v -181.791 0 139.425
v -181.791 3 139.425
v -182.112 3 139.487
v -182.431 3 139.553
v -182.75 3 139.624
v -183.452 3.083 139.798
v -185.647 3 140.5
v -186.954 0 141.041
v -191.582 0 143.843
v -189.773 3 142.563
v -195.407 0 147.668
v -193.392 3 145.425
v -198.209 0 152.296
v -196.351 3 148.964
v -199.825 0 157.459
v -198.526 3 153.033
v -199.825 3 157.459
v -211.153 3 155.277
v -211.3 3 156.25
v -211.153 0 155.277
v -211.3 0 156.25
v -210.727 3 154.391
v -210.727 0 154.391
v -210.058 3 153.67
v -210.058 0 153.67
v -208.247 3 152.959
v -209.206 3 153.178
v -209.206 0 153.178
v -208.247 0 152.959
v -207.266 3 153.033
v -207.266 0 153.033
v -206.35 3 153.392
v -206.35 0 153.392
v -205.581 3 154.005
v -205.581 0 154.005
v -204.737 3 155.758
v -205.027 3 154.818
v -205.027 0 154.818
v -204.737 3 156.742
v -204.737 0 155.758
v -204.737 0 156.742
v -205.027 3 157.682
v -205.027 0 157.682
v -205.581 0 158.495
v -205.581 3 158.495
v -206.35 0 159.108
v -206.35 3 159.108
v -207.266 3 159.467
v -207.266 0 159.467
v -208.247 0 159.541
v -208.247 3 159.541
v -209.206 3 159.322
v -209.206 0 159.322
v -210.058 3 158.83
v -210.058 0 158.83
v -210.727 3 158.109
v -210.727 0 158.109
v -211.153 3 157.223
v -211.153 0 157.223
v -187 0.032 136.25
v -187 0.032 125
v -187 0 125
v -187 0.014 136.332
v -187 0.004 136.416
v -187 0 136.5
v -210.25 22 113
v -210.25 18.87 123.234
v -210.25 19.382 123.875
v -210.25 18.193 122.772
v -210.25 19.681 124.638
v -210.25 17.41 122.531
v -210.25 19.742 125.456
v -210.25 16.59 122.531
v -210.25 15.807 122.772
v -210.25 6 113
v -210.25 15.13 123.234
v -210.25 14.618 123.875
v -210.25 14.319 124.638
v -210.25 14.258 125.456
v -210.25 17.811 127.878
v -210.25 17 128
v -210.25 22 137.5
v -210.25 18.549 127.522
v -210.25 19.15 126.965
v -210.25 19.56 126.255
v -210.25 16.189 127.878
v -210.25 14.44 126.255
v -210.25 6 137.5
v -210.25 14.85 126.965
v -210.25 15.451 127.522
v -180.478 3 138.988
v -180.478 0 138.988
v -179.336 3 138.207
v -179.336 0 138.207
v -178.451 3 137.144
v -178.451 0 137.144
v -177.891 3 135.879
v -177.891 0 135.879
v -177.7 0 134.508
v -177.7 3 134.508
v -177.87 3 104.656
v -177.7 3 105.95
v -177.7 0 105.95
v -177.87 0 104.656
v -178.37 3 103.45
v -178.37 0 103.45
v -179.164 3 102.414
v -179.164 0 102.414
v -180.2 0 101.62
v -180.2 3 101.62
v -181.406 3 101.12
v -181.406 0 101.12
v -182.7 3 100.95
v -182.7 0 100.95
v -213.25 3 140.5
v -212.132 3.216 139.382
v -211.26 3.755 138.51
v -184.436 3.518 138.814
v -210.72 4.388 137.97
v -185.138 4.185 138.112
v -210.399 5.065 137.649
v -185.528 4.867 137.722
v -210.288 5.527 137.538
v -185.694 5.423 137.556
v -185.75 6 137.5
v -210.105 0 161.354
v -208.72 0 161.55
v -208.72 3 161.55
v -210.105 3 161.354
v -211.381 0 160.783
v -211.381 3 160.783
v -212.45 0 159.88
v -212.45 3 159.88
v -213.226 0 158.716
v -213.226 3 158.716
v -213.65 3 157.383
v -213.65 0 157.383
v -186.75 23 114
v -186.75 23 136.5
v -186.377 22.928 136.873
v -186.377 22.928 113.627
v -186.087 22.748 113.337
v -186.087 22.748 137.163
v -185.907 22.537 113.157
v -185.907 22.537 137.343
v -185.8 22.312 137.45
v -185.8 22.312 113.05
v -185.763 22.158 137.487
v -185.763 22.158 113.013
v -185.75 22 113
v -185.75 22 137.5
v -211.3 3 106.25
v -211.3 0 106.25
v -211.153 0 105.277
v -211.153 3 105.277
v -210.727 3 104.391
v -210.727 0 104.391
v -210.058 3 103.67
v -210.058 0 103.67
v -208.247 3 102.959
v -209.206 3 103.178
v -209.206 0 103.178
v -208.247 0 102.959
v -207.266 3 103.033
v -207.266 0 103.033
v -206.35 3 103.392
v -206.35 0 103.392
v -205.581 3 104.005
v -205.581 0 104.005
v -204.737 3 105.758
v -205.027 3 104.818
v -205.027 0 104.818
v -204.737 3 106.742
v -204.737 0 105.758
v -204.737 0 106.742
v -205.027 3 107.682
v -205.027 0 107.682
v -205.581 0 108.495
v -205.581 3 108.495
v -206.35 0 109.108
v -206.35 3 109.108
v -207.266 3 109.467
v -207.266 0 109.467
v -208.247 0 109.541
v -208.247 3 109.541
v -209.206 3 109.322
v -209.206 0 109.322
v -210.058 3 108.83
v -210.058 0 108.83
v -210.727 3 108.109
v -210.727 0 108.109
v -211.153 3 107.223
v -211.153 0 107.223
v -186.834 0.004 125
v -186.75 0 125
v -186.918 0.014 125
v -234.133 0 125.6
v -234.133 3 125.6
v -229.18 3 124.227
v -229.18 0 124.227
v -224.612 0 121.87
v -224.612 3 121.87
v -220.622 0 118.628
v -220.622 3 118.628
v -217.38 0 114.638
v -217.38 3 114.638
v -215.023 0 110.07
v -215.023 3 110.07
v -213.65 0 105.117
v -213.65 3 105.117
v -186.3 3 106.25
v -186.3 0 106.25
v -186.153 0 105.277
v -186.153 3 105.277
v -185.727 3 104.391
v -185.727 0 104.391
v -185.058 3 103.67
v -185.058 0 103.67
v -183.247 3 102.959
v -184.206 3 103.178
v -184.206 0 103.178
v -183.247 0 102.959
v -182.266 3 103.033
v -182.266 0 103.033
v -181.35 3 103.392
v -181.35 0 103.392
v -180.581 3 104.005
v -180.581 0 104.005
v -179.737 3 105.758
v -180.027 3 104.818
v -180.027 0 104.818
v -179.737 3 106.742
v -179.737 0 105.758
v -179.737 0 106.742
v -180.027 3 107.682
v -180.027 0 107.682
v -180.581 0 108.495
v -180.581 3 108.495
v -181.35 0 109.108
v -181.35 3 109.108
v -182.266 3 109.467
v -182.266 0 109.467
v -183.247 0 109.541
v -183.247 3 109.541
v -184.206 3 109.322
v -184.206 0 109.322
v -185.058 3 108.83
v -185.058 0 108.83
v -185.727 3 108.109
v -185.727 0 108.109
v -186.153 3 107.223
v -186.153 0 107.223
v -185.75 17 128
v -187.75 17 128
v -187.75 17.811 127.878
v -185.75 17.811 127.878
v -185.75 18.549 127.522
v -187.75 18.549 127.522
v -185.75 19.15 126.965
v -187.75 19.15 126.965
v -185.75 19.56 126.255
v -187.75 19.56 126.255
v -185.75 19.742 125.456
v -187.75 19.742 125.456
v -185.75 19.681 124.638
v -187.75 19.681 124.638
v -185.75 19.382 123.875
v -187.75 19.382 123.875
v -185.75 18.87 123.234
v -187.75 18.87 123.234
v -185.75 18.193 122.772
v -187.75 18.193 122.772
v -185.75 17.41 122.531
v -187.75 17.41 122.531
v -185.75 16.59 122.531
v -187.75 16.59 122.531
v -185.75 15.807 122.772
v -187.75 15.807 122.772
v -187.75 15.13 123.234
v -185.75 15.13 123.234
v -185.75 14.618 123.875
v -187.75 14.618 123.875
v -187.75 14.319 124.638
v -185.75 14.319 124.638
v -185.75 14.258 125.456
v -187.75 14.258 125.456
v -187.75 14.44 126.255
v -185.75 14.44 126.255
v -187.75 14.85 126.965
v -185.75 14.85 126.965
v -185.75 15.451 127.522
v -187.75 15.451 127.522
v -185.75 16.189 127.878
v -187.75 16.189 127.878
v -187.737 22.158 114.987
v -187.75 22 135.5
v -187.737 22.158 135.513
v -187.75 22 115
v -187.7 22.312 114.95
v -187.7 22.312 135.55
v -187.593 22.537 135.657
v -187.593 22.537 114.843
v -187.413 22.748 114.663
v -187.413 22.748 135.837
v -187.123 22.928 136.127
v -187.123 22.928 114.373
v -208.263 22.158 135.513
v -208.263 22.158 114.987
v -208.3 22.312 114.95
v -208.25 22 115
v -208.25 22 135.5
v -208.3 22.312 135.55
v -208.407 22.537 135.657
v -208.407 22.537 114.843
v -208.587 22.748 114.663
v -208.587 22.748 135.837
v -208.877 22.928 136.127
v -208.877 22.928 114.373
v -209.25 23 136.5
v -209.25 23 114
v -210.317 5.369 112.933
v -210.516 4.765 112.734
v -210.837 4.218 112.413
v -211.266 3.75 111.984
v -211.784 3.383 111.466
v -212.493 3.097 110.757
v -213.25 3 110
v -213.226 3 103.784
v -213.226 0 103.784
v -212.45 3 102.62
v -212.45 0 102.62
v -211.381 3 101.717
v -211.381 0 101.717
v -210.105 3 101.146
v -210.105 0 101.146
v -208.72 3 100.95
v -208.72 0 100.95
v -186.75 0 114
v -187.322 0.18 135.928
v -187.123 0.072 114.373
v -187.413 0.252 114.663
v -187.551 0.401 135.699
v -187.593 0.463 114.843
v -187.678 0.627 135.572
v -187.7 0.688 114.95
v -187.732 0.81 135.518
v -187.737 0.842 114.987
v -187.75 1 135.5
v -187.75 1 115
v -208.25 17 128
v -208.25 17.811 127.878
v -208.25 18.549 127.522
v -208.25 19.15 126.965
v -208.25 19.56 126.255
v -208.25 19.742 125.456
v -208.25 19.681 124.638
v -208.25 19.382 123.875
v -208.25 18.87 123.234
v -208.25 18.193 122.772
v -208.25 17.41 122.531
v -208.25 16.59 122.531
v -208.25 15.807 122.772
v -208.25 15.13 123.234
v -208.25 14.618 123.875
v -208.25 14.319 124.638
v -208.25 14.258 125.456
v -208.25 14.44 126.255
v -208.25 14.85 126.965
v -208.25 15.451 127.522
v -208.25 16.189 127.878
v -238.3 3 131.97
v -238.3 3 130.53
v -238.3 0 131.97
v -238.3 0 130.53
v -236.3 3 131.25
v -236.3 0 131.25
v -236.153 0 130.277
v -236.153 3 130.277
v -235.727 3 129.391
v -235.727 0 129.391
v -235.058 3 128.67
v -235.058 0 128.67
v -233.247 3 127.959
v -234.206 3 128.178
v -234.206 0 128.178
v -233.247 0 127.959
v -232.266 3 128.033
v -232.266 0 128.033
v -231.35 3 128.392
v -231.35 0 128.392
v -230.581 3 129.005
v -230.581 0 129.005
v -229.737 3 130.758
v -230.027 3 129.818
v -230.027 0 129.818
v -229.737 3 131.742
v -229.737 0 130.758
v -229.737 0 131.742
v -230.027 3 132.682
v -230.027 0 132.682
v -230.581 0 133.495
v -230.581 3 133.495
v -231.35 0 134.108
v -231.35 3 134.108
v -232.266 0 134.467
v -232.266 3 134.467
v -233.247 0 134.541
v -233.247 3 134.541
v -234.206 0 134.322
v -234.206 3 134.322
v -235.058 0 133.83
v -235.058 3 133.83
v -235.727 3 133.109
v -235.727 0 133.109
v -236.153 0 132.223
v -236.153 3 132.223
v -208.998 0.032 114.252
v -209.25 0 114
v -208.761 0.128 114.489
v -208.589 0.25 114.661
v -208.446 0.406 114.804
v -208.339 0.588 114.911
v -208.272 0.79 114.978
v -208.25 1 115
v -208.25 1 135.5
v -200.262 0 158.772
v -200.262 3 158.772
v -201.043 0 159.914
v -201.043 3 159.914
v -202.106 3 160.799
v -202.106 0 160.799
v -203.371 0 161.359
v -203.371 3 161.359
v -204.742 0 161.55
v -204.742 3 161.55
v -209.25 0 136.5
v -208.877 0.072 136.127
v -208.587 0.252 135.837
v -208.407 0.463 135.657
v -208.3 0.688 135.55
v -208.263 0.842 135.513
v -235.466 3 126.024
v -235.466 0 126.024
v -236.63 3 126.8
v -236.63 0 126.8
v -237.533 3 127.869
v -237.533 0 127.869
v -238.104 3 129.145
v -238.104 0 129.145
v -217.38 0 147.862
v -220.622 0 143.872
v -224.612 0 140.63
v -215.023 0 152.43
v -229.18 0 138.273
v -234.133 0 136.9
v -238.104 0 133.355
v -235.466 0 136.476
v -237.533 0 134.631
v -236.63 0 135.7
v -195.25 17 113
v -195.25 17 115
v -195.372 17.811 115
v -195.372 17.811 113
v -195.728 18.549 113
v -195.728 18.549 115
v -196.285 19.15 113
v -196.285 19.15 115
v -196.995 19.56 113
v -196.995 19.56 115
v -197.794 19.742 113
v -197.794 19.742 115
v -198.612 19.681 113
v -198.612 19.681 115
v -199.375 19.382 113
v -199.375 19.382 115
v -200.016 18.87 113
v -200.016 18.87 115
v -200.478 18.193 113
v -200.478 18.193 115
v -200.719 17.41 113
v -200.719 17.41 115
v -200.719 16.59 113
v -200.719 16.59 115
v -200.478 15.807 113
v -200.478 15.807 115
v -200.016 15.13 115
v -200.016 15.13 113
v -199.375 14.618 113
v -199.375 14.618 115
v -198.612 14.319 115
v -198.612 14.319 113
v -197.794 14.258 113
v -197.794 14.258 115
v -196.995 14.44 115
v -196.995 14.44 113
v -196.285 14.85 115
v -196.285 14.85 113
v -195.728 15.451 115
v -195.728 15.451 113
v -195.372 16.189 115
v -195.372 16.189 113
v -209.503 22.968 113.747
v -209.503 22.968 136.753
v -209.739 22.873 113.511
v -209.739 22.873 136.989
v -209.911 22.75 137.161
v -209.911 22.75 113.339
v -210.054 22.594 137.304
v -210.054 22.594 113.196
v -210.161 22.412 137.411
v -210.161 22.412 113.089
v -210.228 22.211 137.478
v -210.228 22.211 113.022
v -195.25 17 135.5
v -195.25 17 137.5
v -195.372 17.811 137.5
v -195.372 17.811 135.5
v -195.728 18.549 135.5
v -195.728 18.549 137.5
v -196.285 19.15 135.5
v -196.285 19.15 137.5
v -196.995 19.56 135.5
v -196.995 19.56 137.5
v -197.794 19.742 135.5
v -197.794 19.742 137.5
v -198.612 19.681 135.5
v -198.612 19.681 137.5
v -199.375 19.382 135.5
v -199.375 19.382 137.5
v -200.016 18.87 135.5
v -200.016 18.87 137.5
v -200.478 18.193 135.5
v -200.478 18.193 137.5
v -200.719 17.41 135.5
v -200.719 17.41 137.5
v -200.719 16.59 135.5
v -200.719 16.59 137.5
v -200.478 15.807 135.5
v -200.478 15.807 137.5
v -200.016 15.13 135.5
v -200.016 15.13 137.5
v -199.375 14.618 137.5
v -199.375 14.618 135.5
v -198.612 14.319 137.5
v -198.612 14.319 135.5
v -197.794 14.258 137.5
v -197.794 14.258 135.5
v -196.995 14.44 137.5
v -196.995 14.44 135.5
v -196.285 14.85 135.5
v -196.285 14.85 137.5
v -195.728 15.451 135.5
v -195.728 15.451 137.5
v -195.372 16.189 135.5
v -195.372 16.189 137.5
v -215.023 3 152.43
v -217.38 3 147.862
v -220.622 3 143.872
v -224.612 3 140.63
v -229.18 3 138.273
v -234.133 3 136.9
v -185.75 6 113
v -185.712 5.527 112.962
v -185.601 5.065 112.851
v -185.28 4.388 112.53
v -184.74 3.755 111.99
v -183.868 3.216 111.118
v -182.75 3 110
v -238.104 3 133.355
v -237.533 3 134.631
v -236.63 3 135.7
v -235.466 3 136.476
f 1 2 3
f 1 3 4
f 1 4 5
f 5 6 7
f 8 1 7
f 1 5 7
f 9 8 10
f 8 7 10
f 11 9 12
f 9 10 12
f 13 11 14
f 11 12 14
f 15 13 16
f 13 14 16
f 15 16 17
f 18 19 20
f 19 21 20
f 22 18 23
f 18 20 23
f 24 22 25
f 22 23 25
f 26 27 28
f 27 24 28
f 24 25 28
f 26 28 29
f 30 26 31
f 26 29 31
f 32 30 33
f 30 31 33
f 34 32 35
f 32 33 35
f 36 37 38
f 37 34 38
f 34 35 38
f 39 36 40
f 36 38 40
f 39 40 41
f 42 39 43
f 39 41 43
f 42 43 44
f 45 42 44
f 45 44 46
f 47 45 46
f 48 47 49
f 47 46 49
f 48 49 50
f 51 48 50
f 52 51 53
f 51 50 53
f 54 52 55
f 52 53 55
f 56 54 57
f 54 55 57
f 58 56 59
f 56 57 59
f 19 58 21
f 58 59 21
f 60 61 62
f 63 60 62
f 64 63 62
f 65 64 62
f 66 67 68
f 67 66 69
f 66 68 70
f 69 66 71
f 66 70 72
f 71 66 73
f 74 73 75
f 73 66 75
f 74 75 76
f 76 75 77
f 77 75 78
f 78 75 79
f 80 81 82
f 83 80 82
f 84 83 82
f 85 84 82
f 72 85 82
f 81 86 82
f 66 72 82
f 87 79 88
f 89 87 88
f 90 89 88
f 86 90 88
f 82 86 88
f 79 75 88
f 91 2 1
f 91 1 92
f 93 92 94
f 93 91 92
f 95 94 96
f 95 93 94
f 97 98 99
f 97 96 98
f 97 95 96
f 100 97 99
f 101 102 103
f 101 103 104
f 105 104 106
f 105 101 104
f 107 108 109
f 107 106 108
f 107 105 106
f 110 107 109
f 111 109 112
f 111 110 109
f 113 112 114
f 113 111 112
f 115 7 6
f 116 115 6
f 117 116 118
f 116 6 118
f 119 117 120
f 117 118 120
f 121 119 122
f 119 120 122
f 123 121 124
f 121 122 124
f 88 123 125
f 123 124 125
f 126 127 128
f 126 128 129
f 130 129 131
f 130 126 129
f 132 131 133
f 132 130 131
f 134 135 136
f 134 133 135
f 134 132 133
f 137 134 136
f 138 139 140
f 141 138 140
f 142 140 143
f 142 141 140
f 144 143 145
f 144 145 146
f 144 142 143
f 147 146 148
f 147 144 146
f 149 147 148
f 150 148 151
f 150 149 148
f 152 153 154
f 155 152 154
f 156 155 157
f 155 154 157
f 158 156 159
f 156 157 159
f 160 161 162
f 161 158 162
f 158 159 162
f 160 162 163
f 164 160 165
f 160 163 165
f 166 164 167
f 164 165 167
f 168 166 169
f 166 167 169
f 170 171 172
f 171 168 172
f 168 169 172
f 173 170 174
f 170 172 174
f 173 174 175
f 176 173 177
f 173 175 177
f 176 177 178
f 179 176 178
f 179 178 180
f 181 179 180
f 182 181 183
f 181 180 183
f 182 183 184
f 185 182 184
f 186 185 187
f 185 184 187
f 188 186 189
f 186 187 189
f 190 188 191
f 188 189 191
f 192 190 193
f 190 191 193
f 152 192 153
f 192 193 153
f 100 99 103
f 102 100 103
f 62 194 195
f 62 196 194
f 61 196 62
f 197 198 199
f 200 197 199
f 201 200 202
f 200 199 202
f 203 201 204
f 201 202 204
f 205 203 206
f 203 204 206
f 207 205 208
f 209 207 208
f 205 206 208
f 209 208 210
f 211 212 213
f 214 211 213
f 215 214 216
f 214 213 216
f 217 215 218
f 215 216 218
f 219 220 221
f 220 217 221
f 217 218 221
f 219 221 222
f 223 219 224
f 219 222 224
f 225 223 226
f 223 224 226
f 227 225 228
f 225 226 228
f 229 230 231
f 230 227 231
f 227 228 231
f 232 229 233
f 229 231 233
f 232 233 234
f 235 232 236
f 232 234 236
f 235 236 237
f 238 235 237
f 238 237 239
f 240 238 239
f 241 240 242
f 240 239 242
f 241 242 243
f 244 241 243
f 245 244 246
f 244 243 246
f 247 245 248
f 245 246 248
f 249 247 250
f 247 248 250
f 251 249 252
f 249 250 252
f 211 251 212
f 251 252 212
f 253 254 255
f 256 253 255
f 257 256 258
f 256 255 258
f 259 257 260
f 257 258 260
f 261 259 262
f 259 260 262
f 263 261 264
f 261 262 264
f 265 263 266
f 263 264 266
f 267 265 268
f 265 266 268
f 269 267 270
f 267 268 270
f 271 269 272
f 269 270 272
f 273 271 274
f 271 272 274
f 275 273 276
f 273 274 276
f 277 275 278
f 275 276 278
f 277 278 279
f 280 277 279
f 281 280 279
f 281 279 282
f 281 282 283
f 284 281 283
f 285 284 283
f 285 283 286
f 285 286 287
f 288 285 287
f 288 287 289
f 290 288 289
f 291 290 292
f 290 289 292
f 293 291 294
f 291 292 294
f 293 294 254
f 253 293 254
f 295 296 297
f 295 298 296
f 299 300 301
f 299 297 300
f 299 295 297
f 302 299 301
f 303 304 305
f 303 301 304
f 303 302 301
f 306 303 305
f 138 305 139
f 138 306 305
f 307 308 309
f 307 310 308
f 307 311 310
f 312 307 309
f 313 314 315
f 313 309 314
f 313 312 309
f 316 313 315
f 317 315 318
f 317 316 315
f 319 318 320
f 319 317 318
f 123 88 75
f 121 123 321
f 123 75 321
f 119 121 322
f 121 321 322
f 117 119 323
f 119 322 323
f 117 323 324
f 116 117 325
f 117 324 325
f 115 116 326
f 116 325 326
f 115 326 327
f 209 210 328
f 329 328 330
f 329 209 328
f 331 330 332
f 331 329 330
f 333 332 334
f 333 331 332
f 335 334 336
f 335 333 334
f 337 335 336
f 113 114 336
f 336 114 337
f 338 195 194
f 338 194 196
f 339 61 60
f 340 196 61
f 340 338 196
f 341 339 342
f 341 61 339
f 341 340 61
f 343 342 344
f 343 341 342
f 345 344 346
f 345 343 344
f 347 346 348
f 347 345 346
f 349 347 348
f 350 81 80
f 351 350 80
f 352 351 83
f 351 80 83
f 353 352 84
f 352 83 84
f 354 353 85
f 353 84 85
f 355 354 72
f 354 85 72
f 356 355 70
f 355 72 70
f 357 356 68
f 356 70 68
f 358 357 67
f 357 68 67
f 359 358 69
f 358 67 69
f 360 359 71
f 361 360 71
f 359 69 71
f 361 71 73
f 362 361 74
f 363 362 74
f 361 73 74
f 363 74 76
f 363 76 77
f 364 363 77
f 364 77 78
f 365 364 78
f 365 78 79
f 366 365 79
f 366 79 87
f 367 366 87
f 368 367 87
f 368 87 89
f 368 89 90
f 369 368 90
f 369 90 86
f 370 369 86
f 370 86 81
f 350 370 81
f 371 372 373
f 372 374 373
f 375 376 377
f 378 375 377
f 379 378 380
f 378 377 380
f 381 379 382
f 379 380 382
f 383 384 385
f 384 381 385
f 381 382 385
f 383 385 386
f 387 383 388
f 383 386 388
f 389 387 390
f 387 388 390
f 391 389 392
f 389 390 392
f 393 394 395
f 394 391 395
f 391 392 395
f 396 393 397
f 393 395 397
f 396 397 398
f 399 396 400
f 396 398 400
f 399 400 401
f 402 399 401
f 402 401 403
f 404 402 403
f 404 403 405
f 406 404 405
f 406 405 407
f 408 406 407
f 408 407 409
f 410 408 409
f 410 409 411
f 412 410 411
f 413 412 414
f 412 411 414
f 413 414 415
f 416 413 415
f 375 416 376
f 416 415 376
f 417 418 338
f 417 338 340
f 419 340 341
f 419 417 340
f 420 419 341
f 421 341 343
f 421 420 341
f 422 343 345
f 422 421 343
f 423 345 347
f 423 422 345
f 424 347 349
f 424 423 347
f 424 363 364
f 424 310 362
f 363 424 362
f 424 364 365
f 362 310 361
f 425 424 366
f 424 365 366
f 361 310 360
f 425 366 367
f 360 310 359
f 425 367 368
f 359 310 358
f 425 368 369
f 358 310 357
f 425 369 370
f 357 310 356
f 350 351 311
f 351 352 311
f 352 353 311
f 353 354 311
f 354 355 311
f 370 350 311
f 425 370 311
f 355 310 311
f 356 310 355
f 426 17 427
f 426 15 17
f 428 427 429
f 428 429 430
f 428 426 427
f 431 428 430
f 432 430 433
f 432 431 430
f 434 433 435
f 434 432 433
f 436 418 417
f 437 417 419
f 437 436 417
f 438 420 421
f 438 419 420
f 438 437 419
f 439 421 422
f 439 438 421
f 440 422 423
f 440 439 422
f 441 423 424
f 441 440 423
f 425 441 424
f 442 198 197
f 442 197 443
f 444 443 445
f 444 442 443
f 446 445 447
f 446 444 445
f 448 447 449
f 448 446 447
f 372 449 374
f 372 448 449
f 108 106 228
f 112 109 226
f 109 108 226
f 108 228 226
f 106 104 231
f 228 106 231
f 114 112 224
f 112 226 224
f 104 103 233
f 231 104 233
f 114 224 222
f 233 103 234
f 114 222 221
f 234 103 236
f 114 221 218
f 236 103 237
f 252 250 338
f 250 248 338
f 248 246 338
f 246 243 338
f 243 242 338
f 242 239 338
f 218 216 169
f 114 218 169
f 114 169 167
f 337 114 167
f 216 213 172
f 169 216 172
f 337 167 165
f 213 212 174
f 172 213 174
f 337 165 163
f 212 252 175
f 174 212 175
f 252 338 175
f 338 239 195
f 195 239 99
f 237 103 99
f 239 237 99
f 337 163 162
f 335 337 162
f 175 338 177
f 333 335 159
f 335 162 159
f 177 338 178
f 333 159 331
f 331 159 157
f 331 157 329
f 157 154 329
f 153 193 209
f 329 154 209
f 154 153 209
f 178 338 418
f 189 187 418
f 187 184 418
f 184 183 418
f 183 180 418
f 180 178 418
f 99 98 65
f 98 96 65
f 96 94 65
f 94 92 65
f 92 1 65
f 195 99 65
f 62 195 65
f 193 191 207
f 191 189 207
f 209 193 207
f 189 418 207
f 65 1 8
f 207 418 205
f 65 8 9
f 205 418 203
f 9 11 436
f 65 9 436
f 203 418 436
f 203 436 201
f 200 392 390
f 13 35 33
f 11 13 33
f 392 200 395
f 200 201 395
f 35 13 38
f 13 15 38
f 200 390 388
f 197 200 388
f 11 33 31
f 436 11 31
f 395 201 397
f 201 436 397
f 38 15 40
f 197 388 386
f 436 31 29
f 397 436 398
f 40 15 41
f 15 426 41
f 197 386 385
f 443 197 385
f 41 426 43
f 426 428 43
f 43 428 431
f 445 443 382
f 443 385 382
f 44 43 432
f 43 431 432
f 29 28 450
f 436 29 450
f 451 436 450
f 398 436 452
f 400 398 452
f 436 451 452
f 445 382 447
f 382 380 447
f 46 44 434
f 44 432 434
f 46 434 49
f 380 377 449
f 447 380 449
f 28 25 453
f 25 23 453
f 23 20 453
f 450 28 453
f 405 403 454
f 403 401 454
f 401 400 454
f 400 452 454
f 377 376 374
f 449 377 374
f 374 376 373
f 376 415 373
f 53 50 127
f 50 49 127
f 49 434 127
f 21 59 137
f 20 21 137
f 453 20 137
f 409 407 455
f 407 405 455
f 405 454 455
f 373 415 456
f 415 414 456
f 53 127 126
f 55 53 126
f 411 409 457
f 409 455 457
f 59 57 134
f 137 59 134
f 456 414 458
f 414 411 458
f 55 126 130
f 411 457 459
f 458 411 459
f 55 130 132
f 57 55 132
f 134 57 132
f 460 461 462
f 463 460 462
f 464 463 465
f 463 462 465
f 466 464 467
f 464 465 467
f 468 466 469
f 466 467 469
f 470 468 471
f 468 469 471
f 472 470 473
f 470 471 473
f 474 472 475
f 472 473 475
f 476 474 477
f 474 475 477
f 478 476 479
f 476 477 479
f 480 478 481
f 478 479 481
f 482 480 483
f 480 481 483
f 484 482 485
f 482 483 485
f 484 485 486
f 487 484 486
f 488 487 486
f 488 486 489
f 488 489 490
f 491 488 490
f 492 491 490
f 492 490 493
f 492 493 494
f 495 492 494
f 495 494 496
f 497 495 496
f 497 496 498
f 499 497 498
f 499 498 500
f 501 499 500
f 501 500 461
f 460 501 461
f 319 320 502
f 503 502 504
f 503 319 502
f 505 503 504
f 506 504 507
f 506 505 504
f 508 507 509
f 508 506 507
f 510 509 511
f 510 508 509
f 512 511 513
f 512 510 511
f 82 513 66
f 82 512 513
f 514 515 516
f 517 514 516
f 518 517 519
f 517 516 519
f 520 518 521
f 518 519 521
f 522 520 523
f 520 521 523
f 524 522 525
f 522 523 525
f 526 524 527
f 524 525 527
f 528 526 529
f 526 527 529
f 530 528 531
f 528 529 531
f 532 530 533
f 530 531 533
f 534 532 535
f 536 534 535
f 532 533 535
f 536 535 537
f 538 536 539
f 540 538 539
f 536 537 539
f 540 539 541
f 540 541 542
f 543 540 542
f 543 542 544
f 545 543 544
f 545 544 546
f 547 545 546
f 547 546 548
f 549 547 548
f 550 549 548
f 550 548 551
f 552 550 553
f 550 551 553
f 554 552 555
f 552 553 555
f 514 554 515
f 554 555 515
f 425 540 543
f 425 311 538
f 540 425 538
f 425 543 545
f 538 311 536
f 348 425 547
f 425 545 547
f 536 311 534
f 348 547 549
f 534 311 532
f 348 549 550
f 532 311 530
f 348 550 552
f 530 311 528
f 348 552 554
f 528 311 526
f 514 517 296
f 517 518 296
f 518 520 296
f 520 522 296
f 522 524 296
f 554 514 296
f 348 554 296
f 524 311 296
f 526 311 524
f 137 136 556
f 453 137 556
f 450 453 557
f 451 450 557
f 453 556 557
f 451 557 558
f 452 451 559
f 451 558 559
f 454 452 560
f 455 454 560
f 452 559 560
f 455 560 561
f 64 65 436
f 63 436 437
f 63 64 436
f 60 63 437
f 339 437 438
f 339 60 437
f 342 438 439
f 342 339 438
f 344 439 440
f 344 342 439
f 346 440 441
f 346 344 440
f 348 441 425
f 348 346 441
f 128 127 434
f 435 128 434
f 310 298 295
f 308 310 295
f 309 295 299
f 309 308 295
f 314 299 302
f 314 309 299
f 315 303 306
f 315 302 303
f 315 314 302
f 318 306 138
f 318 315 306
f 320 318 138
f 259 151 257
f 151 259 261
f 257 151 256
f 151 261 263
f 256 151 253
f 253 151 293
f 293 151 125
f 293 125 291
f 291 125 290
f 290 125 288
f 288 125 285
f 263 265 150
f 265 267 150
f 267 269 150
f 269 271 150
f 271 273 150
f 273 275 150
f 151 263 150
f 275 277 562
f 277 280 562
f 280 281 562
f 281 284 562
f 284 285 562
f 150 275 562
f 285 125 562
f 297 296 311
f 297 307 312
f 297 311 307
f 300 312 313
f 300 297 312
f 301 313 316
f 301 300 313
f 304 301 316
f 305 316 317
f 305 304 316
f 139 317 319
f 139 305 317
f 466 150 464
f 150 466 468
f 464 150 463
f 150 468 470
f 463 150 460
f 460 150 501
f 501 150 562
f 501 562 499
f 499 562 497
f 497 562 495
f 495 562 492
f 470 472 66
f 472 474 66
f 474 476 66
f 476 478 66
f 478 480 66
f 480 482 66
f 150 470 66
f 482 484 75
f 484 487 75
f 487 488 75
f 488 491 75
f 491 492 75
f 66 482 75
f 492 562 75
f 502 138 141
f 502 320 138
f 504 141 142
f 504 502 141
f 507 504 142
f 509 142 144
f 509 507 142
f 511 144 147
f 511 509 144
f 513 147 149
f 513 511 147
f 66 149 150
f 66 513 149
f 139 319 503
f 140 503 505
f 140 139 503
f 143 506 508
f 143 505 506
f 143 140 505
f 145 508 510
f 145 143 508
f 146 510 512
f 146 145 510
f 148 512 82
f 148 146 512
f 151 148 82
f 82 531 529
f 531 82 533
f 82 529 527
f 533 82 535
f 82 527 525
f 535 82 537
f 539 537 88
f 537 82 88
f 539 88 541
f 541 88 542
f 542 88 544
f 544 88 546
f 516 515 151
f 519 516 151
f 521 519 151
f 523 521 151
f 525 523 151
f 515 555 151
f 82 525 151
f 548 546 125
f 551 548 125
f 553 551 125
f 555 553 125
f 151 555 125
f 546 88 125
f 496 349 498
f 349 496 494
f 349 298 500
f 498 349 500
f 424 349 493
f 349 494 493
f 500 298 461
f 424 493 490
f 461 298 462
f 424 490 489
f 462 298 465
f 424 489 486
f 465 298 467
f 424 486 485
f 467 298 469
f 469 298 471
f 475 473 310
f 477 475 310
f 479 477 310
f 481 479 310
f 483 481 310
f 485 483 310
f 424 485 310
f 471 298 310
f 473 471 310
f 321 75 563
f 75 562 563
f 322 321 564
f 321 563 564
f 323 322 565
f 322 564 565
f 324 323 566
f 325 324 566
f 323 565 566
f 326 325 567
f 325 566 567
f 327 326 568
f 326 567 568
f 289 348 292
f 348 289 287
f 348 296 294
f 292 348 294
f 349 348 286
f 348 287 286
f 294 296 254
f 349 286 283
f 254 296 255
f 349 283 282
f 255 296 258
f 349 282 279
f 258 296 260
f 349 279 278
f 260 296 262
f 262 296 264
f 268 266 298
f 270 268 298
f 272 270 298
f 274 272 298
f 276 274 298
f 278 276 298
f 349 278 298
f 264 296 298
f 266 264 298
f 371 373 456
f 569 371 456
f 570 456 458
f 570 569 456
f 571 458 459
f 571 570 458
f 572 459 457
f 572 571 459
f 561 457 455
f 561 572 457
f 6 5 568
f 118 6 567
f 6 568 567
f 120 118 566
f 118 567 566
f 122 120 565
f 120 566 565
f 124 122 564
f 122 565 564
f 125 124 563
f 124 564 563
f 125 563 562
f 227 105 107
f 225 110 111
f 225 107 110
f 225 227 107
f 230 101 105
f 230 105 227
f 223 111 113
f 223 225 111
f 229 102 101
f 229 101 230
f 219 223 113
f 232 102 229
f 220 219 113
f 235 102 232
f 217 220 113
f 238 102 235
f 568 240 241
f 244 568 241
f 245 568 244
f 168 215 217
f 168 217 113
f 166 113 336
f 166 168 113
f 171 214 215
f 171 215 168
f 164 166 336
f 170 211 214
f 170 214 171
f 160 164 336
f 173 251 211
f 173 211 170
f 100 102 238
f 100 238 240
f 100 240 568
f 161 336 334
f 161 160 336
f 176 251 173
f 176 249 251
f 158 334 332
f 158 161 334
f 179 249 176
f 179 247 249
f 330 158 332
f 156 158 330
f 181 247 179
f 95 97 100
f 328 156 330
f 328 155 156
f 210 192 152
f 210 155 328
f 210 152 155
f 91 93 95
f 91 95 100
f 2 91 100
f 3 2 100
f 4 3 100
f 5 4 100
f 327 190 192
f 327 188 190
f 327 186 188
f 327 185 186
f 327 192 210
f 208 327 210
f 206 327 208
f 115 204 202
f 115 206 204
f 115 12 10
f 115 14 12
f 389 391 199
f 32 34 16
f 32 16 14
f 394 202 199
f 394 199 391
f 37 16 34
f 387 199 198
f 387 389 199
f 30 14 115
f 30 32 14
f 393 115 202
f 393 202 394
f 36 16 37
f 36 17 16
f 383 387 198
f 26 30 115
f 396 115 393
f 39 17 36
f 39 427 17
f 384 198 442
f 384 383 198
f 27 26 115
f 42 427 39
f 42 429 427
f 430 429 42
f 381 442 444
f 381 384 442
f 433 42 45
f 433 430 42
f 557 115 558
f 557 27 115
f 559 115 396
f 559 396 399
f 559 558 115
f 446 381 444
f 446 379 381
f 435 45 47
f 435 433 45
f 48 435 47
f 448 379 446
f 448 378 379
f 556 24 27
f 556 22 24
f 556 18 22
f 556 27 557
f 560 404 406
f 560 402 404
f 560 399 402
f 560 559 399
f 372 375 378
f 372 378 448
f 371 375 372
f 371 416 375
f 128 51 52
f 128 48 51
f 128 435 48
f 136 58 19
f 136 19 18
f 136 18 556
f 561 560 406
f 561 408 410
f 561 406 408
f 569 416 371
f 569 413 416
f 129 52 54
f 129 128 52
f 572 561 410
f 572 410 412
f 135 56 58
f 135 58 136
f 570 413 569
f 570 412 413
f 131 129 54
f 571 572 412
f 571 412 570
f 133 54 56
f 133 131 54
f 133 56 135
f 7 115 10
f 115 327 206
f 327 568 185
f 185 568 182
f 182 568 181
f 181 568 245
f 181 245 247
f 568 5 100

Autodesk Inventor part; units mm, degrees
ref_plane "YZ Plane" through (0, 0, 0) normal (1, 0, 0) x (0, 1, 0)
ref_plane "XZ Plane" through (0, 0, 0) normal (0, 1, 0) x (-1, 0, 0)
ref_plane "XY Plane" through (0, 0, 0) normal (0, 0, 1) x (1, 0, 0)
sketch "Sketch1" plane through (0, 0, 0) normal (0, 1, 0) x (-1, 0, 0)
  line L0 (245.5, 243.75) -> (-204.5, 243.75)
  line L1 (-204.5, 243.75) -> (-204.5, -206.25)
  line L2 (-204.5, -206.25) -> (245.5, -206.25)
  line L3 (245.5, -206.25) -> (245.5, 243.75)
  circle A0 centre (233, 231.25) radius 3.3
  circle A1 centre (233, 206.25) radius 3.3
  circle A2 centre (233, 181.25) radius 3.3
  circle A3 centre (233, 156.25) radius 3.3
  circle A4 centre (233, 131.25) radius 3.3
  circle A5 centre (233, 106.25) radius 3.3
  circle A6 centre (233, 81.25) radius 3.3
  circle A7 centre (233, 56.25) radius 3.3
  circle A8 centre (233, 31.25) radius 3.3
  circle A9 centre (233, 6.25) radius 3.3
  circle A10 centre (233, -18.75) radius 3.3
  circle A11 centre (233, -43.75) radius 3.3
  circle A12 centre (233, -68.75) radius 3.3
  circle A13 centre (233, -93.75) radius 3.3
  circle A14 centre (233, -118.75) radius 3.3
  circle A15 centre (233, -143.75) radius 3.3
  circle A16 centre (233, -168.75) radius 3.3
  circle A17 centre (233, -193.75) radius 3.3
  circle A18 centre (208, 231.25) radius 3.3
  circle A19 centre (208, 206.25) radius 3.3
  circle A20 centre (208, 181.25) radius 3.3
  circle A21 centre (208, 156.25) radius 3.3
  circle A22 centre (208, 131.25) radius 3.3
  circle A23 centre (208, 106.25) radius 3.3
  circle A24 centre (208, 81.25) radius 3.3
  circle A25 centre (208, 56.25) radius 3.3
  circle A26 centre (208, 31.25) radius 3.3
  circle A27 centre (208, 6.25) radius 3.3
  circle A28 centre (208, -18.75) radius 3.3
  circle A29 centre (208, -43.75) radius 3.3
  circle A30 centre (208, -68.75) radius 3.3
  circle A31 centre (208, -93.75) radius 3.3
  circle A32 centre (208, -118.75) radius 3.3
  circle A33 centre (208, -143.75) radius 3.3
  circle A34 centre (208, -168.75) radius 3.3
  circle A35 centre (208, -193.75) radius 3.3
  circle A36 centre (183, 231.25) radius 3.3
  circle A37 centre (183, 206.25) radius 3.3
  circle A38 centre (183, 181.25) radius 3.3
  circle A39 centre (183, 156.25) radius 3.3
  circle A40 centre (183, 131.25) radius 3.3
  circle A41 centre (183, 106.25) radius 3.3
  circle A42 centre (183, 81.25) radius 3.3
  circle A43 centre (183, 56.25) radius 3.3
  circle A44 centre (183, 31.25) radius 3.3
  circle A45 centre (183, 6.25) radius 3.3
  circle A46 centre (183, -18.75) radius 3.3
  circle A47 centre (183, -43.75) radius 3.3
  circle A48 centre (183, -68.75) radius 3.3
  circle A49 centre (183, -93.75) radius 3.3
  circle A50 centre (183, -118.75) radius 3.3
  circle A51 centre (183, -143.75) radius 3.3
  circle A52 centre (183, -168.75) radius 3.3
  circle A53 centre (183, -193.75) radius 3.3
  circle A54 centre (158, 231.25) radius 3.3
  circle A55 centre (158, 206.25) radius 3.3
  circle A56 centre (158, 181.25) radius 3.3
  circle A57 centre (158, 156.25) radius 3.3
  circle A58 centre (158, 131.25) radius 3.3
  circle A59 centre (158, 106.25) radius 3.3
  circle A60 centre (158, 81.25) radius 3.3
  circle A61 centre (158, 56.25) radius 3.3
  circle A62 centre (158, 31.25) radius 3.3
  circle A63 centre (158, 6.25) radius 3.3
  circle A64 centre (158, -18.75) radius 3.3
  circle A65 centre (158, -43.75) radius 3.3
  circle A66 centre (158, -68.75) radius 3.3
  circle A67 centre (158, -93.75) radius 3.3
  circle A68 centre (158, -118.75) radius 3.3
  circle A69 centre (158, -143.75) radius 3.3
  circle A70 centre (158, -168.75) radius 3.3
  circle A71 centre (158, -193.75) radius 3.3
  circle A72 centre (133, 231.25) radius 3.3
  circle A73 centre (133, 206.25) radius 3.3
  circle A74 centre (133, 181.25) radius 3.3
  circle A75 centre (133, 156.25) radius 3.3
  circle A76 centre (133, 131.25) radius 3.3
  circle A77 centre (133, 106.25) radius 3.3
  circle A78 centre (133, 81.25) radius 3.3
  circle A79 centre (133, 56.25) radius 3.3
  circle A80 centre (133, 31.25) radius 3.3
  circle A81 centre (133, 6.25) radius 3.3
  circle A82 centre (133, -18.75) radius 3.3
  circle A83 centre (133, -43.75) radius 3.3
  circle A84 centre (133, -68.75) radius 3.3
  circle A85 centre (133, -93.75) radius 3.3
  circle A86 centre (133, -118.75) radius 3.3
  circle A87 centre (133, -143.75) radius 3.3
  circle A88 centre (133, -168.75) radius 3.3
  circle A89 centre (133, -193.75) radius 3.3
  circle A90 centre (108, 231.25) radius 3.3
  circle A91 centre (108, 206.25) radius 3.3
  circle A92 centre (108, 181.25) radius 3.3
  circle A93 centre (108, 156.25) radius 3.3
  circle A94 centre (108, 131.25) radius 3.3
  circle A95 centre (108, 106.25) radius 3.3
  circle A96 centre (108, 81.25) radius 3.3
  circle A97 centre (108, 56.25) radius 3.3
  circle A98 centre (108, 31.25) radius 3.3
  circle A99 centre (108, 6.25) radius 3.3
  circle A100 centre (108, -18.75) radius 3.3
  circle A101 centre (108, -43.75) radius 3.3
  circle A102 centre (108, -68.75) radius 3.3
  circle A103 centre (108, -93.75) radius 3.3
  circle A104 centre (108, -118.75) radius 3.3
  circle A105 centre (108, -143.75) radius 3.3
  circle A106 centre (108, -168.75) radius 3.3
  circle A107 centre (108, -193.75) radius 3.3
  circle A108 centre (83, 231.25) radius 3.3
  circle A109 centre (83, 206.25) radius 3.3
  circle A110 centre (83, 181.25) radius 3.3
  circle A111 centre (83, 156.25) radius 3.3
  circle A112 centre (83, 131.25) radius 3.3
  circle A113 centre (83, 106.25) radius 3.3
  circle A114 centre (83, 81.25) radius 3.3
  circle A115 centre (83, 56.25) radius 3.3
  circle A116 centre (83, 31.25) radius 3.3
  circle A117 centre (83, 6.25) radius 3.3
  circle A118 centre (83, -18.75) radius 3.3
  circle A119 centre (83, -43.75) radius 3.3
  circle A120 centre (83, -68.75) radius 3.3
  circle A121 centre (83, -93.75) radius 3.3
  circle A122 centre (83, -118.75) radius 3.3
  circle A123 centre (83, -143.75) radius 3.3
  circle A124 centre (83, -168.75) radius 3.3
  circle A125 centre (83, -193.75) radius 3.3
  circle A126 centre (58, 231.25) radius 3.3
  circle A127 centre (58, 206.25) radius 3.3
  circle A128 centre (58, 181.25) radius 3.3
  circle A129 centre (58, 156.25) radius 3.3
  circle A130 centre (58, 131.25) radius 3.3
  circle A131 centre (58, 106.25) radius 3.3
  circle A132 centre (58, 81.25) radius 3.3
  circle A133 centre (58, 56.25) radius 3.3
  circle A134 centre (58, 31.25) radius 3.3
  circle A135 centre (58, 6.25) radius 3.3
  circle A136 centre (58, -18.75) radius 3.3
  circle A137 centre (58, -43.75) radius 3.3
  circle A138 centre (58, -68.75) radius 3.3
  circle A139 centre (58, -93.75) radius 3.3
  circle A140 centre (58, -118.75) radius 3.3
  circle A141 centre (58, -143.75) radius 3.3
  circle A142 centre (58, -168.75) radius 3.3
  circle A143 centre (58, -193.75) radius 3.3
  circle A144 centre (33, 231.25) radius 3.3
  circle A145 centre (33, 206.25) radius 3.3
  circle A146 centre (33, 181.25) radius 3.3
  circle A147 centre (33, 156.25) radius 3.3
  circle A148 centre (33, 131.25) radius 3.3
  circle A149 centre (33, 106.25) radius 3.3
  circle A150 centre (33, 81.25) radius 3.3
  circle A151 centre (33, 56.25) radius 3.3
  circle A152 centre (33, 31.25) radius 3.3
  circle A153 centre (33, 6.25) radius 3.3
  circle A154 centre (33, -18.75) radius 3.3
  circle A155 centre (33, -43.75) radius 3.3
  circle A156 centre (33, -68.75) radius 3.3
  circle A157 centre (33, -93.75) radius 3.3
  circle A158 centre (33, -118.75) radius 3.3
  circle A159 centre (33, -143.75) radius 3.3
  circle A160 centre (33, -168.75) radius 3.3
  circle A161 centre (33, -193.75) radius 3.3
  circle A162 centre (8, 231.25) radius 3.3
  circle A163 centre (8, 206.25) radius 3.3
  circle A164 centre (8, 181.25) radius 3.3
  circle A165 centre (8, 156.25) radius 3.3
  circle A166 centre (8, 131.25) radius 3.3
  circle A167 centre (8, 106.25) radius 3.3
  circle A168 centre (8, 81.25) radius 3.3
  circle A169 centre (8, 56.25) radius 3.3
  circle A170 centre (8, 31.25) radius 3.3
  circle A171 centre (8, 6.25) radius 3.3
  circle A172 centre (8, -18.75) radius 3.3
  circle A173 centre (8, -43.75) radius 3.3
  circle A174 centre (8, -68.75) radius 3.3
  circle A175 centre (8, -93.75) radius 3.3
  circle A176 centre (8, -118.75) radius 3.3
  circle A177 centre (8, -143.75) radius 3.3
  circle A178 centre (8, -168.75) radius 3.3
  circle A179 centre (8, -193.75) radius 3.3
  circle A180 centre (-17, 231.25) radius 3.3
  circle A181 centre (-17, 206.25) radius 3.3
  circle A182 centre (-17, 181.25) radius 3.3
  circle A183 centre (-17, 156.25) radius 3.3
  circle A184 centre (-17, 131.25) radius 3.3
  circle A185 centre (-17, 106.25) radius 3.3
  circle A186 centre (-17, 81.25) radius 3.3
  circle A187 centre (-17, 56.25) radius 3.3
  circle A188 centre (-17, 31.25) radius 3.3
  circle A189 centre (-17, 6.25) radius 3.3
  circle A190 centre (-17, -18.75) radius 3.3
  circle A191 centre (-17, -43.75) radius 3.3
  circle A192 centre (-17, -68.75) radius 3.3
  circle A193 centre (-17, -93.75) radius 3.3
  circle A194 centre (-17, -118.75) radius 3.3
  circle A195 centre (-17, -143.75) radius 3.3
  circle A196 centre (-17, -168.75) radius 3.3
  circle A197 centre (-17, -193.75) radius 3.3
  circle A198 centre (-42, 231.25) radius 3.3
  circle A199 centre (-42, 206.25) radius 3.3
  circle A200 centre (-42, 181.25) radius 3.3
  circle A201 centre (-42, 156.25) radius 3.3
  circle A202 centre (-42, 131.25) radius 3.3
  circle A203 centre (-42, 106.25) radius 3.3
  circle A204 centre (-42, 81.25) radius 3.3
  circle A205 centre (-42, 56.25) radius 3.3
  circle A206 centre (-42, 31.25) radius 3.3
  circle A207 centre (-42, 6.25) radius 3.3
  circle A208 centre (-42, -18.75) radius 3.3
  circle A209 centre (-42, -43.75) radius 3.3
  circle A210 centre (-42, -68.75) radius 3.3
  circle A211 centre (-42, -93.75) radius 3.3
  circle A212 centre (-42, -118.75) radius 3.3
  circle A213 centre (-42, -143.75) radius 3.3
  circle A214 centre (-42, -168.75) radius 3.3
  circle A215 centre (-42, -193.75) radius 3.3
  circle A216 centre (-67, 231.25) radius 3.3
  circle A217 centre (-67, 206.25) radius 3.3
  circle A218 centre (-67, 181.25) radius 3.3
  circle A219 centre (-67, 156.25) radius 3.3
  circle A220 centre (-67, 131.25) radius 3.3
  circle A221 centre (-67, 106.25) radius 3.3
  circle A222 centre (-67, 81.25) radius 3.3
  circle A223 centre (-67, 56.25) radius 3.3
  circle A224 centre (-67, 31.25) radius 3.3
  circle A225 centre (-67, 6.25) radius 3.3
  circle A226 centre (-67, -18.75) radius 3.3
  circle A227 centre (-67, -43.75) radius 3.3
  circle A228 centre (-67, -68.75) radius 3.3
  circle A229 centre (-67, -93.75) radius 3.3
  circle A230 centre (-67, -118.75) radius 3.3
  circle A231 centre (-67, -143.75) radius 3.3
  circle A232 centre (-67, -168.75) radius 3.3
  circle A233 centre (-67, -193.75) radius 3.3
  circle A234 centre (-92, 231.25) radius 3.3
  circle A235 centre (-92, 206.25) radius 3.3
  circle A236 centre (-92, 181.25) radius 3.3
  circle A237 centre (-92, 156.25) radius 3.3
  circle A238 centre (-92, 131.25) radius 3.3
  circle A239 centre (-92, 106.25) radius 3.3
  circle A240 centre (-92, 81.25) radius 3.3
  circle A241 centre (-92, 56.25) radius 3.3
  circle A242 centre (-92, 31.25) radius 3.3
  circle A243 centre (-92, 6.25) radius 3.3
  circle A244 centre (-92, -18.75) radius 3.3
  circle A245 centre (-92, -43.75) radius 3.3
  circle A246 centre (-92, -68.75) radius 3.3
  circle A247 centre (-92, -93.75) radius 3.3
  circle A248 centre (-92, -118.75) radius 3.3
  circle A249 centre (-92, -143.75) radius 3.3
  circle A250 centre (-92, -168.75) radius 3.3
  circle A251 centre (-92, -193.75) radius 3.3
  circle A252 centre (-117, 231.25) radius 3.3
  circle A253 centre (-117, 206.25) radius 3.3
  circle A254 centre (-117, 181.25) radius 3.3
  circle A255 centre (-117, 156.25) radius 3.3
  circle A256 centre (-117, 131.25) radius 3.3
  circle A257 centre (-117, 106.25) radius 3.3
  circle A258 centre (-117, 81.25) radius 3.3
  circle A259 centre (-117, 56.25) radius 3.3
  circle A260 centre (-117, 31.25) radius 3.3
  circle A261 centre (-117, 6.25) radius 3.3
  circle A262 centre (-117, -18.75) radius 3.3
  circle A263 centre (-117, -43.75) radius 3.3
  circle A264 centre (-117, -68.75) radius 3.3
  circle A265 centre (-117, -93.75) radius 3.3
  circle A266 centre (-117, -118.75) radius 3.3
  circle A267 centre (-117, -143.75) radius 3.3
  circle A268 centre (-117, -168.75) radius 3.3
  circle A269 centre (-117, -193.75) radius 3.3
  circle A270 centre (-142, 231.25) radius 3.3
  circle A271 centre (-142, 206.25) radius 3.3
  circle A272 centre (-142, 181.25) radius 3.3
  circle A273 centre (-142, 156.25) radius 3.3
  circle A274 centre (-142, 131.25) radius 3.3
  circle A275 centre (-142, 106.25) radius 3.3
  circle A276 centre (-142, 81.25) radius 3.3
  circle A277 centre (-142, 56.25) radius 3.3
  circle A278 centre (-142, 31.25) radius 3.3
  circle A279 centre (-142, 6.25) radius 3.3
  circle A280 centre (-142, -18.75) radius 3.3
  circle A281 centre (-142, -43.75) radius 3.3
  circle A282 centre (-142, -68.75) radius 3.3
  circle A283 centre (-142, -93.75) radius 3.3
  circle A284 centre (-142, -118.75) radius 3.3
  circle A285 centre (-142, -143.75) radius 3.3
  circle A286 centre (-142, -168.75) radius 3.3
  circle A287 centre (-142, -193.75) radius 3.3
  circle A288 centre (-167, 231.25) radius 3.3
  circle A289 centre (-167, 206.25) radius 3.3
  circle A290 centre (-167, 181.25) radius 3.3
  circle A291 centre (-167, 156.25) radius 3.3
  circle A292 centre (-167, 131.25) radius 3.3
  circle A293 centre (-167, 106.25) radius 3.3
  circle A294 centre (-167, 81.25) radius 3.3
  circle A295 centre (-167, 56.25) radius 3.3
  circle A296 centre (-167, 31.25) radius 3.3
  circle A297 centre (-167, 6.25) radius 3.3
  circle A298 centre (-167, -18.75) radius 3.3
  circle A299 centre (-167, -43.75) radius 3.3
  circle A300 centre (-167, -68.75) radius 3.3
  circle A301 centre (-167, -93.75) radius 3.3
  circle A302 centre (-167, -118.75) radius 3.3
  circle A303 centre (-167, -143.75) radius 3.3
  circle A304 centre (-167, -168.75) radius 3.3
  circle A305 centre (-167, -193.75) radius 3.3
  circle A306 centre (-192, 231.25) radius 3.3
  circle A307 centre (-192, 206.25) radius 3.3
  circle A308 centre (-192, 181.25) radius 3.3
  circle A309 centre (-192, 156.25) radius 3.3
  circle A310 centre (-192, 131.25) radius 3.3
  circle A311 centre (-192, 106.25) radius 3.3
  circle A312 centre (-192, 81.25) radius 3.3
  circle A313 centre (-192, 56.25) radius 3.3
  circle A314 centre (-192, 31.25) radius 3.3
  circle A315 centre (-192, 6.25) radius 3.3
  circle A316 centre (-192, -18.75) radius 3.3
  circle A317 centre (-192, -43.75) radius 3.3
  circle A318 centre (-192, -68.75) radius 3.3
  circle A319 centre (-192, -93.75) radius 3.3
  circle A320 centre (-192, -118.75) radius 3.3
  circle A321 centre (-192, -143.75) radius 3.3
  circle A322 centre (-192, -168.75) radius 3.3
  circle A323 centre (-192, -193.75) radius 3.3
  line L4 (208, 241.25) -> (168, 241.25)
  line L5 (168, 241.25) -> (168, 221.25)
  line L6 (168, 221.25) -> (208, 221.25)
  line L7 (208, 221.25) -> (208, 241.25)
  line L8 (208, -203.75) -> (168, -203.75)
  line L9 (168, -203.75) -> (168, -183.75)
  line L10 (168, -183.75) -> (208, -183.75)
  line L11 (208, -183.75) -> (208, -203.75)
  line L12 (188, 221.25) -> (168, 221.25)
  line L13 (168, 221.25) -> (168, -183.75)
  line L14 (168, -183.75) -> (188, -183.75)
  line L15 (188, -183.75) -> (188, 221.25)
  line L16 (168, -5.25) -> (188, -5.25)
  line L17 (188, -5.25) -> (188, 42.75)
  line L18 (188, 42.75) -> (168, 42.75)
  line L19 (168, 42.75) -> (168, -5.25)
  line L20 (168, 42.75) -> (188, 42.75)
  line L21 (188, 42.75) -> (188, 65.75)
  line L22 (188, 65.75) -> (168, 65.75)
  line L23 (168, 65.75) -> (168, 42.75)
  line L24 (188, -5.25) -> (168, -5.25)
  line L25 (168, -5.25) -> (168, -28.25)
  line L26 (168, -28.25) -> (188, -28.25)
  line L27 (188, -28.25) -> (188, -5.25)
  line L28 (188, 65.75) -> (168, 65.75)
  line L29 (168, 65.75) -> (168, 113.75)
  line L30 (168, 113.75) -> (188, 113.75)
  line L31 (188, 113.75) -> (188, 65.75)
  line L32 (188, 113.75) -> (168, 113.75)
  line L33 (168, 113.75) -> (168, 136.75)
  line L34 (168, 136.75) -> (188, 136.75)
  line L35 (188, 136.75) -> (188, 113.75)
  line L36 (188, 135.25) -> (208, 135.25)
  line L37 (208, 135.25) -> (208, 115.25)
  line L38 (208, 115.25) -> (188, 115.25)
  line L39 (188, 115.25) -> (188, 135.25)
  line L40 (177.7, 100.95) -> (238.3, 100.95)
  line L41 (238.3, 100.95) -> (238.3, 161.55)
  line L42 (238.3, 161.55) -> (177.7, 161.55)
  line L43 (177.7, 161.55) -> (177.7, 100.95)
  point P0 (0, 0)
  dimension "d0" = 450
  dimension "d1" = 450
  dimension "d2" = 6.6
  dimension "d3" = 12.5
  dimension "d4" = 12.5
  dimension "d7" = 25
  dimension "d10" = 25
  dimension "d13" = 40
  dimension "d14" = 20
  dimension "d15" = 2.5
  dimension "d16" = 2.5
  dimension "d17" = 20
  dimension "d21" = 48
  dimension "d22" = 178.5
  dimension "d23" = 178.5
  dimension "d24" = 23
  dimension "d25" = 23
  dimension "d26" = 48
  dimension "d27" = 23
  dimension "d28" = 20
  dimension "d29" = 20
  dimension "d30" = 1.5
  dimension "d31" = 60.6
  dimension "d32" = 5.3
  dimension "d33" = 5.3
  dimension "d34" = 5.3
  dimension "d75" = 0
  dimension "d76" = 0
  dimension "d77" = 40
sketch "Sketch2" plane through (0, 0, 0) normal (0, 1, 0) x (-1, 0, 0)
  point P0 (0, 0)
extrude "Extrusion1" add sketch "Sketch1" along normal blind 3 contours L42 L41 L40 L15 L38 L37 A22 L36 | L15 L34 L43 L42 | L15 L30 L43 L34 | L30 L15 L40 L43 | A22 L37 picked at (209.1, 131.25)
sketch "Sketch4" plane through (0, 3, 0) normal (0, 1, 0) x (1, 0, 0)
  line L0 (-210.25, -137.5) -> (-185.75, -137.5)
  line L1 (-185.75, -137.5) -> (-185.75, -113)
  line L2 (-185.75, -113) -> (-210.25, -113)
  line L3 (-210.25, -113) -> (-210.25, -137.5)
  line L4 (-187.75, -135.5) -> (-208.25, -135.5) projected
  line L5 (-208.25, -135.5) -> (-208.25, -115) projected
  point P0 (0, 0)
  dimension "d43" = 24.5
  dimension "d44" = 24.5
  dimension "d45" = 2
  dimension "d46" = 2
extrude "Extrusion3" add sketch "Sketch4" along normal blind 20
sketch "Sketch5" plane through (0, 23, 0) normal (0, 1, 0) x (1, 0, 0)
  line L0 (-208.25, -135.5) -> (-187.75, -135.5)
  line L1 (-187.75, -135.5) -> (-187.75, -115)
  line L2 (-187.75, -115) -> (-208.25, -115)
  line L3 (-208.25, -115) -> (-208.25, -135.5)
  line L4 (-210.25, -113) -> (-210.25, -137.5) projected
  line L5 (-210.25, -137.5) -> (-185.75, -137.5) projected
  point P0 (0, 0)
  dimension "d49" = 20.5
  dimension "d50" = 20.5
  dimension "d51" = 2
  dimension "d52" = 2
extrude "Extrusion4" cut sketch "Sketch5" against normal blind 25
fillet "Fillet1" [suppressed]
sketch "Sketch7" plane through (-207.25, 6, 137.5) normal (0, 0, 1) x (1, 0, 0)
  circle A0 centre (9.25, 11) radius 2.75
  line L0 (-3, 17) -> (21.5, 17) projected
  line L1 (-3, 17) -> (-3, 0) projected
  point P0 (207.25, -6)
  point P1 (0, 17)
  point P2 (18.5, 17)
  dimension "d63" = 5.5
  dimension "d64" = 6
  dimension "d65" = 12.25
extrude "Extrusion6" cut sketch "Sketch7" against normal blind 25
sketch "Sketch8" plane through (-210.25, 6, 116) normal (-1, 0, 0) x (0, 0, 1)
  circle A0 centre (9.25, 11) radius 2.75
  line L0 (-3, 17) -> (21.5, 17) projected
  line L1 (-3, 17) -> (-3, 0) projected
  point P0 (-116, -6)
  point P1 (0, 17)
  point P2 (18.5, 17)
  dimension "d68" = 5.5
  dimension "d69" = 6
  dimension "d70" = 12.25
extrude "Extrusion7" cut sketch "Sketch8" against normal blind 25
fillet "Fillet3" radius 1 8 edges at (-210.25, 23, 125.25) (-198, 23, 137.5) (-185.75, 23, 125.25) (-198, 23, 113) (-198, 23, 115) (-208.25, 23, 125.25) (-187.75, 23, 125.25) (-198, 23, 135.5)
fillet "Fillet4" radius 1 4 edges at (-198, 0, 135.5) (-208.25, 0, 125.25) (-187.75, 0, 125.25) (-198, 0, 115)
sketch "Sketch9" plane through (0, 3, 0) normal (0, 1, 0) x (1, 0, 0)
  line L0 (-238.3, -161.55) -> (-177.7, -161.55) projected
  circle A0 centre (-238.3, -161.55) radius 25
  line L1 (-177.7, -100.95) -> (-238.3, -100.95) projected
  circle A1 centre (-238.3, -100.95) radius 25
  point P0 (0, 0)
  dimension "d78" = 50
  dimension "d79" = 50
extrude "Extrusion8" cut sketch "Sketch9" against normal blind 25
sketch "Sketch10" plane through (0, 3, 0) normal (0, 1, 0) x (1, 0, 0)
  line L0 (-178, -125) -> (-187, -125)
  line L1 (-187, -125) -> (-187, -137.5)
  line L2 (-187, -137.5) -> (-178, -137.5)
  line L3 (-178, -137.5) -> (-178, -125)
  point P0 (0, 0)
extrude "Extrusion9" add sketch "Sketch10" against normal blind 3
sketch "Sketch11" plane through (0, 3, 0) normal (0, 1, 0) x (1, 0, 0)
  line L0 (-213.3, -161.55) -> (-177.7, -161.55) projected
  circle A0 centre (-177.7, -161.55) radius 22.5
  point P0 (0, 0)
  dimension "d84" = 45
extrude "Extrusion10" cut sketch "Sketch11" against normal blind 3
fillet "Fillet5" radius 3 4 edges at (-210.25, 3, 125.25) (-198, 3, 113) (-185.75, 3, 125.25) (-198, 3, 137.5)
fillet "Fillet6" radius 5 7 edges at (-238.3, 1.5, 136.55) (-238.3, 1.5, 125.95) (-213.3, 1.5, 100.95) (-213.3, 1.5, 161.55) (-200.2, 1.5, 161.55) (-177.7, 1.5, 139.05) (-177.7, 1.5, 100.95)
properties part number "overview"
